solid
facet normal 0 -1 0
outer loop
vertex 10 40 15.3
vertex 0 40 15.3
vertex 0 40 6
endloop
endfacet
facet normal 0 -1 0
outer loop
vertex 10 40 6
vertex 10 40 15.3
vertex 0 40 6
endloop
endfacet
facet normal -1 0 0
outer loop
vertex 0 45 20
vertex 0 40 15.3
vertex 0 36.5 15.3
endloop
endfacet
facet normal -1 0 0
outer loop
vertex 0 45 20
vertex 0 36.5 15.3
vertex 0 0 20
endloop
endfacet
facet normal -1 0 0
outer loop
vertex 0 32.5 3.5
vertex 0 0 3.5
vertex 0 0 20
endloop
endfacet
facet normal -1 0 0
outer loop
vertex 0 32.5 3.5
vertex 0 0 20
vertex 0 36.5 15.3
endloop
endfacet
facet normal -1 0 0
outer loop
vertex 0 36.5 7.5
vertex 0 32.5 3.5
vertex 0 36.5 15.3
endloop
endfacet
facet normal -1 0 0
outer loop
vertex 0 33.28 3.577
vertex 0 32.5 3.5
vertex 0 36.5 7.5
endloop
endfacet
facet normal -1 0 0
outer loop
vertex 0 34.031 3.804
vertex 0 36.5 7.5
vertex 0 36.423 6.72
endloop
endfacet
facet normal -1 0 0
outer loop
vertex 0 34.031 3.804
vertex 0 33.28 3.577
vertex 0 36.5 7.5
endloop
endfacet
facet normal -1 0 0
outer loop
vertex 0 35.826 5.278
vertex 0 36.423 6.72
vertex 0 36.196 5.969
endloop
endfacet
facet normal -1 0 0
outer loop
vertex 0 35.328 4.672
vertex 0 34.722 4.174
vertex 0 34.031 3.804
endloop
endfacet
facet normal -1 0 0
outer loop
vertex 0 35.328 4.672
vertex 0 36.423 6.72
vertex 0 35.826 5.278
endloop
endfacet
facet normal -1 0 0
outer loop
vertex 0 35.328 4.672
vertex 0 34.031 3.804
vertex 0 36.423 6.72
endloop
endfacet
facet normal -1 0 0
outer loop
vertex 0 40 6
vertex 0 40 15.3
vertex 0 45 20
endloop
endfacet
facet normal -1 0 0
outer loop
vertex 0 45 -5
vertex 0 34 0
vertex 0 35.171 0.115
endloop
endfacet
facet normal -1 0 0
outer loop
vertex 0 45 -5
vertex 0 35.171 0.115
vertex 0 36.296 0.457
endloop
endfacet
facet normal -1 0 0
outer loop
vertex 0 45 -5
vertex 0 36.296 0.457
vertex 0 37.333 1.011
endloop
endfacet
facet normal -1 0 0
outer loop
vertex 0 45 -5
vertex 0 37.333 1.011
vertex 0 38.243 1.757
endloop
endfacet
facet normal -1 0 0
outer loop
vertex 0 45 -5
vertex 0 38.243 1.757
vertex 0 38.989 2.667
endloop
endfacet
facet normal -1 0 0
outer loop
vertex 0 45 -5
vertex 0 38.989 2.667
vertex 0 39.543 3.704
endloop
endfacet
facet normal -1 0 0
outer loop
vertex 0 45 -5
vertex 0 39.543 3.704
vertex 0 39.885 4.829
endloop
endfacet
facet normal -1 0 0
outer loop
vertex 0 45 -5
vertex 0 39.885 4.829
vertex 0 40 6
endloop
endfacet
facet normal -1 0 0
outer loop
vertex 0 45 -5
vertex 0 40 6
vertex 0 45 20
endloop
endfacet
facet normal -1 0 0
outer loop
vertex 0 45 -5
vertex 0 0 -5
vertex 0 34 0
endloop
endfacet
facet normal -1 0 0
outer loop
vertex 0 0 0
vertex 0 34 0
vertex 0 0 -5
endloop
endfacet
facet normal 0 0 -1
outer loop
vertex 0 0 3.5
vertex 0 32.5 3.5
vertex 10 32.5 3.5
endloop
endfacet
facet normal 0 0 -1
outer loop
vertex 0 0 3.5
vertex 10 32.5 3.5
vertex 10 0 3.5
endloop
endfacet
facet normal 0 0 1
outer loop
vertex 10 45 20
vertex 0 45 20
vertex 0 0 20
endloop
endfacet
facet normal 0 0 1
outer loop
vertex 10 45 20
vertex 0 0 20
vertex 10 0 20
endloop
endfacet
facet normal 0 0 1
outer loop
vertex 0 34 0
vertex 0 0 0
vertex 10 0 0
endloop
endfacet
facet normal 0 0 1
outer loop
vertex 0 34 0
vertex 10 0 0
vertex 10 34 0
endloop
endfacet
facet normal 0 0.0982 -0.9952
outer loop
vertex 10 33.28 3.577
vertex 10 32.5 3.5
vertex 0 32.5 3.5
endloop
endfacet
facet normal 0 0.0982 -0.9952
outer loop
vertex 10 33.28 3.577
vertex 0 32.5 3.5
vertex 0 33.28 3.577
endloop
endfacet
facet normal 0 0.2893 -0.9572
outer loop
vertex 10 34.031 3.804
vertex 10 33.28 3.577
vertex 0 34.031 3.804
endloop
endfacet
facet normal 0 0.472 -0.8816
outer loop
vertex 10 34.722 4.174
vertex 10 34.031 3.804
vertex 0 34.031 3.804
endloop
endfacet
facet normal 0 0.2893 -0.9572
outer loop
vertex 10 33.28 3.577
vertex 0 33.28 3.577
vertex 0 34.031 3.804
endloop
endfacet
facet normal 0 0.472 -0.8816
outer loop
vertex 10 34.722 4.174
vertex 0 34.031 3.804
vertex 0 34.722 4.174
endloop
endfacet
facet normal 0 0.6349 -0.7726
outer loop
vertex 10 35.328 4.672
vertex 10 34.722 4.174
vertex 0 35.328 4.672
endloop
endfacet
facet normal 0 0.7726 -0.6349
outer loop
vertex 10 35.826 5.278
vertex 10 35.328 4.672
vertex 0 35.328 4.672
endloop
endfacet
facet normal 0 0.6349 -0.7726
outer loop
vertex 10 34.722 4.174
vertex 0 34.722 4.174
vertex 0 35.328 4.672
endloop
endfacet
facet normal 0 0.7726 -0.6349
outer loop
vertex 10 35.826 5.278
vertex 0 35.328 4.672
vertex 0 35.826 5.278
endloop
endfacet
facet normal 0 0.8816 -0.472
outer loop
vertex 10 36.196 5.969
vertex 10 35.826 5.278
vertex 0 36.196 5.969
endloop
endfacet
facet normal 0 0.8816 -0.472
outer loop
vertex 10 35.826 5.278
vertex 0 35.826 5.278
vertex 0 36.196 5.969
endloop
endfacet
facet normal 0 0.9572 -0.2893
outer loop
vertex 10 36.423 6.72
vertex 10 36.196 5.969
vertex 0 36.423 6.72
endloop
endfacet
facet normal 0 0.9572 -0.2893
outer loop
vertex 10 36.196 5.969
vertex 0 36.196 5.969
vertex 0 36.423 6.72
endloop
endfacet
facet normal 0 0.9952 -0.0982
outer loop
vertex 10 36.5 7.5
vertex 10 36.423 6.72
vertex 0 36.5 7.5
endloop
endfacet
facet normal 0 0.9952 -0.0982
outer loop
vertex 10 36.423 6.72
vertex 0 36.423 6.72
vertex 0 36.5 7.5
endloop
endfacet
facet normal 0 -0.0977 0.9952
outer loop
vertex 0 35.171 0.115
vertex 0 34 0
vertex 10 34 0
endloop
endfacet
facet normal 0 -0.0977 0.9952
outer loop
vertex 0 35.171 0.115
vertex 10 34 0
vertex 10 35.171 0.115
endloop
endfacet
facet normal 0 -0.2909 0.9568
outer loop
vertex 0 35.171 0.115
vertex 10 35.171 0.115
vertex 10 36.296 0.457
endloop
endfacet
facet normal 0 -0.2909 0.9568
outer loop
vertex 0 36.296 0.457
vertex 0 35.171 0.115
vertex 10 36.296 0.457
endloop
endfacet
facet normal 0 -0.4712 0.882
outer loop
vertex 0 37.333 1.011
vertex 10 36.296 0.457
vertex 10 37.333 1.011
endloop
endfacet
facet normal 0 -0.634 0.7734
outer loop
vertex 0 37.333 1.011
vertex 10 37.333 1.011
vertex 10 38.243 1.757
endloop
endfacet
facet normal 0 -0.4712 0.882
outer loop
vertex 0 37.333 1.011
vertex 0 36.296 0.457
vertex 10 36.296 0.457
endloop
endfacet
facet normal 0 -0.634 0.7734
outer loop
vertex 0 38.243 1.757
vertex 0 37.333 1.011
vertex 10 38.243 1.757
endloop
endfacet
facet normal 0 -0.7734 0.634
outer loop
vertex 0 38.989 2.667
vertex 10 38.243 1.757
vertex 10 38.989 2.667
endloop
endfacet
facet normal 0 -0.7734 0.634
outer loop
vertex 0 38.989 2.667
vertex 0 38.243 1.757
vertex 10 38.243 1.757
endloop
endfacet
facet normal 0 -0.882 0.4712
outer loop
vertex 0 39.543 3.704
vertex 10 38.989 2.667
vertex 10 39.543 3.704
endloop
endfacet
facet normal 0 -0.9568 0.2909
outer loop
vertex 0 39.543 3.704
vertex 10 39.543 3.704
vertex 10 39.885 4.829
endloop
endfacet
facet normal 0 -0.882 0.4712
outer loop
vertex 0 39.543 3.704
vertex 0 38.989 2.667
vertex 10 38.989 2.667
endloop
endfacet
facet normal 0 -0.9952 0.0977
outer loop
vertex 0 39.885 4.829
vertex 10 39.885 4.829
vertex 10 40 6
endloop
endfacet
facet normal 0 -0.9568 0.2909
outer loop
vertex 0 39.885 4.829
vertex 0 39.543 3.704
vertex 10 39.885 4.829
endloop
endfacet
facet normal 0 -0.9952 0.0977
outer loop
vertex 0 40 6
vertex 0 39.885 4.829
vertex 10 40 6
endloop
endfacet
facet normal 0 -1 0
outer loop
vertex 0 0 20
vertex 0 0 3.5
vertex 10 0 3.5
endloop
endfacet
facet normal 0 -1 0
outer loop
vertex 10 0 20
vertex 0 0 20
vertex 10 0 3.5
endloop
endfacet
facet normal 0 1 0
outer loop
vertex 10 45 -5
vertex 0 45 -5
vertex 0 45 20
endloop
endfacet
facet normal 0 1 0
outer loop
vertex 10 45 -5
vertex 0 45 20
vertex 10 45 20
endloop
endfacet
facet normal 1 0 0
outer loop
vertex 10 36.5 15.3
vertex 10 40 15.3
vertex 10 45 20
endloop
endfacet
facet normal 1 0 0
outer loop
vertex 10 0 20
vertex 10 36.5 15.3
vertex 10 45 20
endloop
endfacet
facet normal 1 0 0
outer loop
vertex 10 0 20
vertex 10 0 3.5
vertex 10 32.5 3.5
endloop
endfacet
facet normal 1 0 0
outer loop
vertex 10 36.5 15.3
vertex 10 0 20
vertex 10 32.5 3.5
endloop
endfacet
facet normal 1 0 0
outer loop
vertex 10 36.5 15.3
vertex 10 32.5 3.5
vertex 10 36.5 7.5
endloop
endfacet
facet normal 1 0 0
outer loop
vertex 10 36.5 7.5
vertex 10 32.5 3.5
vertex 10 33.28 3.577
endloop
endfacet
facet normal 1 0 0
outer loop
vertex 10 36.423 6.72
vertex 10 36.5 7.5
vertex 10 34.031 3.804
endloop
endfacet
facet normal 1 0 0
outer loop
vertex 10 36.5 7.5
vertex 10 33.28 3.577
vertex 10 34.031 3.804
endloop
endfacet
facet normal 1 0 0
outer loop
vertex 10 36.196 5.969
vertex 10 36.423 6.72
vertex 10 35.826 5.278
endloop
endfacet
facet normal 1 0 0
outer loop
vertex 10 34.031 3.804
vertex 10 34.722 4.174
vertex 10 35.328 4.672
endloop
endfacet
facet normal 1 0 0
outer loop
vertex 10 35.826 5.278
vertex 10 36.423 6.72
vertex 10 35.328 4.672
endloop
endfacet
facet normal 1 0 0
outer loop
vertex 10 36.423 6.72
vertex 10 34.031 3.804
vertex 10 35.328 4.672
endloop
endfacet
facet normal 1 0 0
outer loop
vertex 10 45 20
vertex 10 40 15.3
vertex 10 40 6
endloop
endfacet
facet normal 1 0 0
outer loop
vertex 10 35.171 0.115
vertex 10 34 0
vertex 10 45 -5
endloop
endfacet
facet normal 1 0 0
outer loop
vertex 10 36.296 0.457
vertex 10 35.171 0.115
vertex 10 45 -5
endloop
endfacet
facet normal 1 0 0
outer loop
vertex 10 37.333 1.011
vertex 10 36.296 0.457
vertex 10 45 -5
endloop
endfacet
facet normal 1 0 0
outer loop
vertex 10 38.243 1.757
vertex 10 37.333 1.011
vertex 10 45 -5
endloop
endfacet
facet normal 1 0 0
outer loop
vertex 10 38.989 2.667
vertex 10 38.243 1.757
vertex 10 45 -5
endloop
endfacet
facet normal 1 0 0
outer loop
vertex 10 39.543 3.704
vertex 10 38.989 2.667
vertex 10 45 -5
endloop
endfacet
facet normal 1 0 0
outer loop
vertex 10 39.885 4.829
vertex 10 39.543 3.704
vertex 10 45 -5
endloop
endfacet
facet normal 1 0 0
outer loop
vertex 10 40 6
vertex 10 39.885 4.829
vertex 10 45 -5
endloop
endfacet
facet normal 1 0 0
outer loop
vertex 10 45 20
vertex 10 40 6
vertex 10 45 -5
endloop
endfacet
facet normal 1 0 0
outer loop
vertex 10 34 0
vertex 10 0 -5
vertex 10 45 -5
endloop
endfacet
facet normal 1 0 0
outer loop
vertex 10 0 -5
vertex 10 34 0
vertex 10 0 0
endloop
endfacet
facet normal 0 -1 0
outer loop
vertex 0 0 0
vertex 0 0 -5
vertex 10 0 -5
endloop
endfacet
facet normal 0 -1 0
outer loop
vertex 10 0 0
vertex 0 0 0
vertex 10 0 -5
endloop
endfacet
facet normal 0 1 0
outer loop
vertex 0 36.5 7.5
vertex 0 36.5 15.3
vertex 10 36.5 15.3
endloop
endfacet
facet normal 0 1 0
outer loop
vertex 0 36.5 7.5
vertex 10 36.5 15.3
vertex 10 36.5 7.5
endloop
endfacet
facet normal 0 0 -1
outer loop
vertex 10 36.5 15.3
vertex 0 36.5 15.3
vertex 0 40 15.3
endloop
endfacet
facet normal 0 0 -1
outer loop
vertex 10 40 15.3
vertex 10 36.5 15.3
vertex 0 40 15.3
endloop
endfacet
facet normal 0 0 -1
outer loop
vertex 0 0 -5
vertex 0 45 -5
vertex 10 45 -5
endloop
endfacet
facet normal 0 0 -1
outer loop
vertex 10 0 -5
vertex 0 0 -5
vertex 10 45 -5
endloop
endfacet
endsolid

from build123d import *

# Parameters (mm, degrees)
BOX_W        = 10
BOX_H        = 45
BOX_DEPTH    = 25
POCKET_DEPTH = 10


with BuildPart() as part:
    # Box → Box (join)
    with BuildSketch(Plane.XY.offset(-5)):
        with Locations((5, 22.5)):
            Rectangle(BOX_W, BOX_H)
    extrude(amount=BOX_DEPTH)

    # Sketch → Pocket (cut)
    with BuildSketch(Plane.YZ):
        with BuildLine():
            Line((40, 15.3), (40, 6))
            ThreePointArc((34, 0), (38.242641, 1.757359), (40, 6))
            Line((0, 0), (34, 0))
            Line((0, 3.5), (0, 0))
            Line((32.5, 3.5), (0, 3.5))
            ThreePointArc((32.5, 3.5), (35.328427, 4.671573), (36.5, 7.5))
            Line((36.5, 15.3), (36.5, 7.5))
            Line((36.5, 15.3), (40, 15.3))
        make_face()
    extrude(amount=POCKET_DEPTH, mode=Mode.SUBTRACT)


solid = part.part
